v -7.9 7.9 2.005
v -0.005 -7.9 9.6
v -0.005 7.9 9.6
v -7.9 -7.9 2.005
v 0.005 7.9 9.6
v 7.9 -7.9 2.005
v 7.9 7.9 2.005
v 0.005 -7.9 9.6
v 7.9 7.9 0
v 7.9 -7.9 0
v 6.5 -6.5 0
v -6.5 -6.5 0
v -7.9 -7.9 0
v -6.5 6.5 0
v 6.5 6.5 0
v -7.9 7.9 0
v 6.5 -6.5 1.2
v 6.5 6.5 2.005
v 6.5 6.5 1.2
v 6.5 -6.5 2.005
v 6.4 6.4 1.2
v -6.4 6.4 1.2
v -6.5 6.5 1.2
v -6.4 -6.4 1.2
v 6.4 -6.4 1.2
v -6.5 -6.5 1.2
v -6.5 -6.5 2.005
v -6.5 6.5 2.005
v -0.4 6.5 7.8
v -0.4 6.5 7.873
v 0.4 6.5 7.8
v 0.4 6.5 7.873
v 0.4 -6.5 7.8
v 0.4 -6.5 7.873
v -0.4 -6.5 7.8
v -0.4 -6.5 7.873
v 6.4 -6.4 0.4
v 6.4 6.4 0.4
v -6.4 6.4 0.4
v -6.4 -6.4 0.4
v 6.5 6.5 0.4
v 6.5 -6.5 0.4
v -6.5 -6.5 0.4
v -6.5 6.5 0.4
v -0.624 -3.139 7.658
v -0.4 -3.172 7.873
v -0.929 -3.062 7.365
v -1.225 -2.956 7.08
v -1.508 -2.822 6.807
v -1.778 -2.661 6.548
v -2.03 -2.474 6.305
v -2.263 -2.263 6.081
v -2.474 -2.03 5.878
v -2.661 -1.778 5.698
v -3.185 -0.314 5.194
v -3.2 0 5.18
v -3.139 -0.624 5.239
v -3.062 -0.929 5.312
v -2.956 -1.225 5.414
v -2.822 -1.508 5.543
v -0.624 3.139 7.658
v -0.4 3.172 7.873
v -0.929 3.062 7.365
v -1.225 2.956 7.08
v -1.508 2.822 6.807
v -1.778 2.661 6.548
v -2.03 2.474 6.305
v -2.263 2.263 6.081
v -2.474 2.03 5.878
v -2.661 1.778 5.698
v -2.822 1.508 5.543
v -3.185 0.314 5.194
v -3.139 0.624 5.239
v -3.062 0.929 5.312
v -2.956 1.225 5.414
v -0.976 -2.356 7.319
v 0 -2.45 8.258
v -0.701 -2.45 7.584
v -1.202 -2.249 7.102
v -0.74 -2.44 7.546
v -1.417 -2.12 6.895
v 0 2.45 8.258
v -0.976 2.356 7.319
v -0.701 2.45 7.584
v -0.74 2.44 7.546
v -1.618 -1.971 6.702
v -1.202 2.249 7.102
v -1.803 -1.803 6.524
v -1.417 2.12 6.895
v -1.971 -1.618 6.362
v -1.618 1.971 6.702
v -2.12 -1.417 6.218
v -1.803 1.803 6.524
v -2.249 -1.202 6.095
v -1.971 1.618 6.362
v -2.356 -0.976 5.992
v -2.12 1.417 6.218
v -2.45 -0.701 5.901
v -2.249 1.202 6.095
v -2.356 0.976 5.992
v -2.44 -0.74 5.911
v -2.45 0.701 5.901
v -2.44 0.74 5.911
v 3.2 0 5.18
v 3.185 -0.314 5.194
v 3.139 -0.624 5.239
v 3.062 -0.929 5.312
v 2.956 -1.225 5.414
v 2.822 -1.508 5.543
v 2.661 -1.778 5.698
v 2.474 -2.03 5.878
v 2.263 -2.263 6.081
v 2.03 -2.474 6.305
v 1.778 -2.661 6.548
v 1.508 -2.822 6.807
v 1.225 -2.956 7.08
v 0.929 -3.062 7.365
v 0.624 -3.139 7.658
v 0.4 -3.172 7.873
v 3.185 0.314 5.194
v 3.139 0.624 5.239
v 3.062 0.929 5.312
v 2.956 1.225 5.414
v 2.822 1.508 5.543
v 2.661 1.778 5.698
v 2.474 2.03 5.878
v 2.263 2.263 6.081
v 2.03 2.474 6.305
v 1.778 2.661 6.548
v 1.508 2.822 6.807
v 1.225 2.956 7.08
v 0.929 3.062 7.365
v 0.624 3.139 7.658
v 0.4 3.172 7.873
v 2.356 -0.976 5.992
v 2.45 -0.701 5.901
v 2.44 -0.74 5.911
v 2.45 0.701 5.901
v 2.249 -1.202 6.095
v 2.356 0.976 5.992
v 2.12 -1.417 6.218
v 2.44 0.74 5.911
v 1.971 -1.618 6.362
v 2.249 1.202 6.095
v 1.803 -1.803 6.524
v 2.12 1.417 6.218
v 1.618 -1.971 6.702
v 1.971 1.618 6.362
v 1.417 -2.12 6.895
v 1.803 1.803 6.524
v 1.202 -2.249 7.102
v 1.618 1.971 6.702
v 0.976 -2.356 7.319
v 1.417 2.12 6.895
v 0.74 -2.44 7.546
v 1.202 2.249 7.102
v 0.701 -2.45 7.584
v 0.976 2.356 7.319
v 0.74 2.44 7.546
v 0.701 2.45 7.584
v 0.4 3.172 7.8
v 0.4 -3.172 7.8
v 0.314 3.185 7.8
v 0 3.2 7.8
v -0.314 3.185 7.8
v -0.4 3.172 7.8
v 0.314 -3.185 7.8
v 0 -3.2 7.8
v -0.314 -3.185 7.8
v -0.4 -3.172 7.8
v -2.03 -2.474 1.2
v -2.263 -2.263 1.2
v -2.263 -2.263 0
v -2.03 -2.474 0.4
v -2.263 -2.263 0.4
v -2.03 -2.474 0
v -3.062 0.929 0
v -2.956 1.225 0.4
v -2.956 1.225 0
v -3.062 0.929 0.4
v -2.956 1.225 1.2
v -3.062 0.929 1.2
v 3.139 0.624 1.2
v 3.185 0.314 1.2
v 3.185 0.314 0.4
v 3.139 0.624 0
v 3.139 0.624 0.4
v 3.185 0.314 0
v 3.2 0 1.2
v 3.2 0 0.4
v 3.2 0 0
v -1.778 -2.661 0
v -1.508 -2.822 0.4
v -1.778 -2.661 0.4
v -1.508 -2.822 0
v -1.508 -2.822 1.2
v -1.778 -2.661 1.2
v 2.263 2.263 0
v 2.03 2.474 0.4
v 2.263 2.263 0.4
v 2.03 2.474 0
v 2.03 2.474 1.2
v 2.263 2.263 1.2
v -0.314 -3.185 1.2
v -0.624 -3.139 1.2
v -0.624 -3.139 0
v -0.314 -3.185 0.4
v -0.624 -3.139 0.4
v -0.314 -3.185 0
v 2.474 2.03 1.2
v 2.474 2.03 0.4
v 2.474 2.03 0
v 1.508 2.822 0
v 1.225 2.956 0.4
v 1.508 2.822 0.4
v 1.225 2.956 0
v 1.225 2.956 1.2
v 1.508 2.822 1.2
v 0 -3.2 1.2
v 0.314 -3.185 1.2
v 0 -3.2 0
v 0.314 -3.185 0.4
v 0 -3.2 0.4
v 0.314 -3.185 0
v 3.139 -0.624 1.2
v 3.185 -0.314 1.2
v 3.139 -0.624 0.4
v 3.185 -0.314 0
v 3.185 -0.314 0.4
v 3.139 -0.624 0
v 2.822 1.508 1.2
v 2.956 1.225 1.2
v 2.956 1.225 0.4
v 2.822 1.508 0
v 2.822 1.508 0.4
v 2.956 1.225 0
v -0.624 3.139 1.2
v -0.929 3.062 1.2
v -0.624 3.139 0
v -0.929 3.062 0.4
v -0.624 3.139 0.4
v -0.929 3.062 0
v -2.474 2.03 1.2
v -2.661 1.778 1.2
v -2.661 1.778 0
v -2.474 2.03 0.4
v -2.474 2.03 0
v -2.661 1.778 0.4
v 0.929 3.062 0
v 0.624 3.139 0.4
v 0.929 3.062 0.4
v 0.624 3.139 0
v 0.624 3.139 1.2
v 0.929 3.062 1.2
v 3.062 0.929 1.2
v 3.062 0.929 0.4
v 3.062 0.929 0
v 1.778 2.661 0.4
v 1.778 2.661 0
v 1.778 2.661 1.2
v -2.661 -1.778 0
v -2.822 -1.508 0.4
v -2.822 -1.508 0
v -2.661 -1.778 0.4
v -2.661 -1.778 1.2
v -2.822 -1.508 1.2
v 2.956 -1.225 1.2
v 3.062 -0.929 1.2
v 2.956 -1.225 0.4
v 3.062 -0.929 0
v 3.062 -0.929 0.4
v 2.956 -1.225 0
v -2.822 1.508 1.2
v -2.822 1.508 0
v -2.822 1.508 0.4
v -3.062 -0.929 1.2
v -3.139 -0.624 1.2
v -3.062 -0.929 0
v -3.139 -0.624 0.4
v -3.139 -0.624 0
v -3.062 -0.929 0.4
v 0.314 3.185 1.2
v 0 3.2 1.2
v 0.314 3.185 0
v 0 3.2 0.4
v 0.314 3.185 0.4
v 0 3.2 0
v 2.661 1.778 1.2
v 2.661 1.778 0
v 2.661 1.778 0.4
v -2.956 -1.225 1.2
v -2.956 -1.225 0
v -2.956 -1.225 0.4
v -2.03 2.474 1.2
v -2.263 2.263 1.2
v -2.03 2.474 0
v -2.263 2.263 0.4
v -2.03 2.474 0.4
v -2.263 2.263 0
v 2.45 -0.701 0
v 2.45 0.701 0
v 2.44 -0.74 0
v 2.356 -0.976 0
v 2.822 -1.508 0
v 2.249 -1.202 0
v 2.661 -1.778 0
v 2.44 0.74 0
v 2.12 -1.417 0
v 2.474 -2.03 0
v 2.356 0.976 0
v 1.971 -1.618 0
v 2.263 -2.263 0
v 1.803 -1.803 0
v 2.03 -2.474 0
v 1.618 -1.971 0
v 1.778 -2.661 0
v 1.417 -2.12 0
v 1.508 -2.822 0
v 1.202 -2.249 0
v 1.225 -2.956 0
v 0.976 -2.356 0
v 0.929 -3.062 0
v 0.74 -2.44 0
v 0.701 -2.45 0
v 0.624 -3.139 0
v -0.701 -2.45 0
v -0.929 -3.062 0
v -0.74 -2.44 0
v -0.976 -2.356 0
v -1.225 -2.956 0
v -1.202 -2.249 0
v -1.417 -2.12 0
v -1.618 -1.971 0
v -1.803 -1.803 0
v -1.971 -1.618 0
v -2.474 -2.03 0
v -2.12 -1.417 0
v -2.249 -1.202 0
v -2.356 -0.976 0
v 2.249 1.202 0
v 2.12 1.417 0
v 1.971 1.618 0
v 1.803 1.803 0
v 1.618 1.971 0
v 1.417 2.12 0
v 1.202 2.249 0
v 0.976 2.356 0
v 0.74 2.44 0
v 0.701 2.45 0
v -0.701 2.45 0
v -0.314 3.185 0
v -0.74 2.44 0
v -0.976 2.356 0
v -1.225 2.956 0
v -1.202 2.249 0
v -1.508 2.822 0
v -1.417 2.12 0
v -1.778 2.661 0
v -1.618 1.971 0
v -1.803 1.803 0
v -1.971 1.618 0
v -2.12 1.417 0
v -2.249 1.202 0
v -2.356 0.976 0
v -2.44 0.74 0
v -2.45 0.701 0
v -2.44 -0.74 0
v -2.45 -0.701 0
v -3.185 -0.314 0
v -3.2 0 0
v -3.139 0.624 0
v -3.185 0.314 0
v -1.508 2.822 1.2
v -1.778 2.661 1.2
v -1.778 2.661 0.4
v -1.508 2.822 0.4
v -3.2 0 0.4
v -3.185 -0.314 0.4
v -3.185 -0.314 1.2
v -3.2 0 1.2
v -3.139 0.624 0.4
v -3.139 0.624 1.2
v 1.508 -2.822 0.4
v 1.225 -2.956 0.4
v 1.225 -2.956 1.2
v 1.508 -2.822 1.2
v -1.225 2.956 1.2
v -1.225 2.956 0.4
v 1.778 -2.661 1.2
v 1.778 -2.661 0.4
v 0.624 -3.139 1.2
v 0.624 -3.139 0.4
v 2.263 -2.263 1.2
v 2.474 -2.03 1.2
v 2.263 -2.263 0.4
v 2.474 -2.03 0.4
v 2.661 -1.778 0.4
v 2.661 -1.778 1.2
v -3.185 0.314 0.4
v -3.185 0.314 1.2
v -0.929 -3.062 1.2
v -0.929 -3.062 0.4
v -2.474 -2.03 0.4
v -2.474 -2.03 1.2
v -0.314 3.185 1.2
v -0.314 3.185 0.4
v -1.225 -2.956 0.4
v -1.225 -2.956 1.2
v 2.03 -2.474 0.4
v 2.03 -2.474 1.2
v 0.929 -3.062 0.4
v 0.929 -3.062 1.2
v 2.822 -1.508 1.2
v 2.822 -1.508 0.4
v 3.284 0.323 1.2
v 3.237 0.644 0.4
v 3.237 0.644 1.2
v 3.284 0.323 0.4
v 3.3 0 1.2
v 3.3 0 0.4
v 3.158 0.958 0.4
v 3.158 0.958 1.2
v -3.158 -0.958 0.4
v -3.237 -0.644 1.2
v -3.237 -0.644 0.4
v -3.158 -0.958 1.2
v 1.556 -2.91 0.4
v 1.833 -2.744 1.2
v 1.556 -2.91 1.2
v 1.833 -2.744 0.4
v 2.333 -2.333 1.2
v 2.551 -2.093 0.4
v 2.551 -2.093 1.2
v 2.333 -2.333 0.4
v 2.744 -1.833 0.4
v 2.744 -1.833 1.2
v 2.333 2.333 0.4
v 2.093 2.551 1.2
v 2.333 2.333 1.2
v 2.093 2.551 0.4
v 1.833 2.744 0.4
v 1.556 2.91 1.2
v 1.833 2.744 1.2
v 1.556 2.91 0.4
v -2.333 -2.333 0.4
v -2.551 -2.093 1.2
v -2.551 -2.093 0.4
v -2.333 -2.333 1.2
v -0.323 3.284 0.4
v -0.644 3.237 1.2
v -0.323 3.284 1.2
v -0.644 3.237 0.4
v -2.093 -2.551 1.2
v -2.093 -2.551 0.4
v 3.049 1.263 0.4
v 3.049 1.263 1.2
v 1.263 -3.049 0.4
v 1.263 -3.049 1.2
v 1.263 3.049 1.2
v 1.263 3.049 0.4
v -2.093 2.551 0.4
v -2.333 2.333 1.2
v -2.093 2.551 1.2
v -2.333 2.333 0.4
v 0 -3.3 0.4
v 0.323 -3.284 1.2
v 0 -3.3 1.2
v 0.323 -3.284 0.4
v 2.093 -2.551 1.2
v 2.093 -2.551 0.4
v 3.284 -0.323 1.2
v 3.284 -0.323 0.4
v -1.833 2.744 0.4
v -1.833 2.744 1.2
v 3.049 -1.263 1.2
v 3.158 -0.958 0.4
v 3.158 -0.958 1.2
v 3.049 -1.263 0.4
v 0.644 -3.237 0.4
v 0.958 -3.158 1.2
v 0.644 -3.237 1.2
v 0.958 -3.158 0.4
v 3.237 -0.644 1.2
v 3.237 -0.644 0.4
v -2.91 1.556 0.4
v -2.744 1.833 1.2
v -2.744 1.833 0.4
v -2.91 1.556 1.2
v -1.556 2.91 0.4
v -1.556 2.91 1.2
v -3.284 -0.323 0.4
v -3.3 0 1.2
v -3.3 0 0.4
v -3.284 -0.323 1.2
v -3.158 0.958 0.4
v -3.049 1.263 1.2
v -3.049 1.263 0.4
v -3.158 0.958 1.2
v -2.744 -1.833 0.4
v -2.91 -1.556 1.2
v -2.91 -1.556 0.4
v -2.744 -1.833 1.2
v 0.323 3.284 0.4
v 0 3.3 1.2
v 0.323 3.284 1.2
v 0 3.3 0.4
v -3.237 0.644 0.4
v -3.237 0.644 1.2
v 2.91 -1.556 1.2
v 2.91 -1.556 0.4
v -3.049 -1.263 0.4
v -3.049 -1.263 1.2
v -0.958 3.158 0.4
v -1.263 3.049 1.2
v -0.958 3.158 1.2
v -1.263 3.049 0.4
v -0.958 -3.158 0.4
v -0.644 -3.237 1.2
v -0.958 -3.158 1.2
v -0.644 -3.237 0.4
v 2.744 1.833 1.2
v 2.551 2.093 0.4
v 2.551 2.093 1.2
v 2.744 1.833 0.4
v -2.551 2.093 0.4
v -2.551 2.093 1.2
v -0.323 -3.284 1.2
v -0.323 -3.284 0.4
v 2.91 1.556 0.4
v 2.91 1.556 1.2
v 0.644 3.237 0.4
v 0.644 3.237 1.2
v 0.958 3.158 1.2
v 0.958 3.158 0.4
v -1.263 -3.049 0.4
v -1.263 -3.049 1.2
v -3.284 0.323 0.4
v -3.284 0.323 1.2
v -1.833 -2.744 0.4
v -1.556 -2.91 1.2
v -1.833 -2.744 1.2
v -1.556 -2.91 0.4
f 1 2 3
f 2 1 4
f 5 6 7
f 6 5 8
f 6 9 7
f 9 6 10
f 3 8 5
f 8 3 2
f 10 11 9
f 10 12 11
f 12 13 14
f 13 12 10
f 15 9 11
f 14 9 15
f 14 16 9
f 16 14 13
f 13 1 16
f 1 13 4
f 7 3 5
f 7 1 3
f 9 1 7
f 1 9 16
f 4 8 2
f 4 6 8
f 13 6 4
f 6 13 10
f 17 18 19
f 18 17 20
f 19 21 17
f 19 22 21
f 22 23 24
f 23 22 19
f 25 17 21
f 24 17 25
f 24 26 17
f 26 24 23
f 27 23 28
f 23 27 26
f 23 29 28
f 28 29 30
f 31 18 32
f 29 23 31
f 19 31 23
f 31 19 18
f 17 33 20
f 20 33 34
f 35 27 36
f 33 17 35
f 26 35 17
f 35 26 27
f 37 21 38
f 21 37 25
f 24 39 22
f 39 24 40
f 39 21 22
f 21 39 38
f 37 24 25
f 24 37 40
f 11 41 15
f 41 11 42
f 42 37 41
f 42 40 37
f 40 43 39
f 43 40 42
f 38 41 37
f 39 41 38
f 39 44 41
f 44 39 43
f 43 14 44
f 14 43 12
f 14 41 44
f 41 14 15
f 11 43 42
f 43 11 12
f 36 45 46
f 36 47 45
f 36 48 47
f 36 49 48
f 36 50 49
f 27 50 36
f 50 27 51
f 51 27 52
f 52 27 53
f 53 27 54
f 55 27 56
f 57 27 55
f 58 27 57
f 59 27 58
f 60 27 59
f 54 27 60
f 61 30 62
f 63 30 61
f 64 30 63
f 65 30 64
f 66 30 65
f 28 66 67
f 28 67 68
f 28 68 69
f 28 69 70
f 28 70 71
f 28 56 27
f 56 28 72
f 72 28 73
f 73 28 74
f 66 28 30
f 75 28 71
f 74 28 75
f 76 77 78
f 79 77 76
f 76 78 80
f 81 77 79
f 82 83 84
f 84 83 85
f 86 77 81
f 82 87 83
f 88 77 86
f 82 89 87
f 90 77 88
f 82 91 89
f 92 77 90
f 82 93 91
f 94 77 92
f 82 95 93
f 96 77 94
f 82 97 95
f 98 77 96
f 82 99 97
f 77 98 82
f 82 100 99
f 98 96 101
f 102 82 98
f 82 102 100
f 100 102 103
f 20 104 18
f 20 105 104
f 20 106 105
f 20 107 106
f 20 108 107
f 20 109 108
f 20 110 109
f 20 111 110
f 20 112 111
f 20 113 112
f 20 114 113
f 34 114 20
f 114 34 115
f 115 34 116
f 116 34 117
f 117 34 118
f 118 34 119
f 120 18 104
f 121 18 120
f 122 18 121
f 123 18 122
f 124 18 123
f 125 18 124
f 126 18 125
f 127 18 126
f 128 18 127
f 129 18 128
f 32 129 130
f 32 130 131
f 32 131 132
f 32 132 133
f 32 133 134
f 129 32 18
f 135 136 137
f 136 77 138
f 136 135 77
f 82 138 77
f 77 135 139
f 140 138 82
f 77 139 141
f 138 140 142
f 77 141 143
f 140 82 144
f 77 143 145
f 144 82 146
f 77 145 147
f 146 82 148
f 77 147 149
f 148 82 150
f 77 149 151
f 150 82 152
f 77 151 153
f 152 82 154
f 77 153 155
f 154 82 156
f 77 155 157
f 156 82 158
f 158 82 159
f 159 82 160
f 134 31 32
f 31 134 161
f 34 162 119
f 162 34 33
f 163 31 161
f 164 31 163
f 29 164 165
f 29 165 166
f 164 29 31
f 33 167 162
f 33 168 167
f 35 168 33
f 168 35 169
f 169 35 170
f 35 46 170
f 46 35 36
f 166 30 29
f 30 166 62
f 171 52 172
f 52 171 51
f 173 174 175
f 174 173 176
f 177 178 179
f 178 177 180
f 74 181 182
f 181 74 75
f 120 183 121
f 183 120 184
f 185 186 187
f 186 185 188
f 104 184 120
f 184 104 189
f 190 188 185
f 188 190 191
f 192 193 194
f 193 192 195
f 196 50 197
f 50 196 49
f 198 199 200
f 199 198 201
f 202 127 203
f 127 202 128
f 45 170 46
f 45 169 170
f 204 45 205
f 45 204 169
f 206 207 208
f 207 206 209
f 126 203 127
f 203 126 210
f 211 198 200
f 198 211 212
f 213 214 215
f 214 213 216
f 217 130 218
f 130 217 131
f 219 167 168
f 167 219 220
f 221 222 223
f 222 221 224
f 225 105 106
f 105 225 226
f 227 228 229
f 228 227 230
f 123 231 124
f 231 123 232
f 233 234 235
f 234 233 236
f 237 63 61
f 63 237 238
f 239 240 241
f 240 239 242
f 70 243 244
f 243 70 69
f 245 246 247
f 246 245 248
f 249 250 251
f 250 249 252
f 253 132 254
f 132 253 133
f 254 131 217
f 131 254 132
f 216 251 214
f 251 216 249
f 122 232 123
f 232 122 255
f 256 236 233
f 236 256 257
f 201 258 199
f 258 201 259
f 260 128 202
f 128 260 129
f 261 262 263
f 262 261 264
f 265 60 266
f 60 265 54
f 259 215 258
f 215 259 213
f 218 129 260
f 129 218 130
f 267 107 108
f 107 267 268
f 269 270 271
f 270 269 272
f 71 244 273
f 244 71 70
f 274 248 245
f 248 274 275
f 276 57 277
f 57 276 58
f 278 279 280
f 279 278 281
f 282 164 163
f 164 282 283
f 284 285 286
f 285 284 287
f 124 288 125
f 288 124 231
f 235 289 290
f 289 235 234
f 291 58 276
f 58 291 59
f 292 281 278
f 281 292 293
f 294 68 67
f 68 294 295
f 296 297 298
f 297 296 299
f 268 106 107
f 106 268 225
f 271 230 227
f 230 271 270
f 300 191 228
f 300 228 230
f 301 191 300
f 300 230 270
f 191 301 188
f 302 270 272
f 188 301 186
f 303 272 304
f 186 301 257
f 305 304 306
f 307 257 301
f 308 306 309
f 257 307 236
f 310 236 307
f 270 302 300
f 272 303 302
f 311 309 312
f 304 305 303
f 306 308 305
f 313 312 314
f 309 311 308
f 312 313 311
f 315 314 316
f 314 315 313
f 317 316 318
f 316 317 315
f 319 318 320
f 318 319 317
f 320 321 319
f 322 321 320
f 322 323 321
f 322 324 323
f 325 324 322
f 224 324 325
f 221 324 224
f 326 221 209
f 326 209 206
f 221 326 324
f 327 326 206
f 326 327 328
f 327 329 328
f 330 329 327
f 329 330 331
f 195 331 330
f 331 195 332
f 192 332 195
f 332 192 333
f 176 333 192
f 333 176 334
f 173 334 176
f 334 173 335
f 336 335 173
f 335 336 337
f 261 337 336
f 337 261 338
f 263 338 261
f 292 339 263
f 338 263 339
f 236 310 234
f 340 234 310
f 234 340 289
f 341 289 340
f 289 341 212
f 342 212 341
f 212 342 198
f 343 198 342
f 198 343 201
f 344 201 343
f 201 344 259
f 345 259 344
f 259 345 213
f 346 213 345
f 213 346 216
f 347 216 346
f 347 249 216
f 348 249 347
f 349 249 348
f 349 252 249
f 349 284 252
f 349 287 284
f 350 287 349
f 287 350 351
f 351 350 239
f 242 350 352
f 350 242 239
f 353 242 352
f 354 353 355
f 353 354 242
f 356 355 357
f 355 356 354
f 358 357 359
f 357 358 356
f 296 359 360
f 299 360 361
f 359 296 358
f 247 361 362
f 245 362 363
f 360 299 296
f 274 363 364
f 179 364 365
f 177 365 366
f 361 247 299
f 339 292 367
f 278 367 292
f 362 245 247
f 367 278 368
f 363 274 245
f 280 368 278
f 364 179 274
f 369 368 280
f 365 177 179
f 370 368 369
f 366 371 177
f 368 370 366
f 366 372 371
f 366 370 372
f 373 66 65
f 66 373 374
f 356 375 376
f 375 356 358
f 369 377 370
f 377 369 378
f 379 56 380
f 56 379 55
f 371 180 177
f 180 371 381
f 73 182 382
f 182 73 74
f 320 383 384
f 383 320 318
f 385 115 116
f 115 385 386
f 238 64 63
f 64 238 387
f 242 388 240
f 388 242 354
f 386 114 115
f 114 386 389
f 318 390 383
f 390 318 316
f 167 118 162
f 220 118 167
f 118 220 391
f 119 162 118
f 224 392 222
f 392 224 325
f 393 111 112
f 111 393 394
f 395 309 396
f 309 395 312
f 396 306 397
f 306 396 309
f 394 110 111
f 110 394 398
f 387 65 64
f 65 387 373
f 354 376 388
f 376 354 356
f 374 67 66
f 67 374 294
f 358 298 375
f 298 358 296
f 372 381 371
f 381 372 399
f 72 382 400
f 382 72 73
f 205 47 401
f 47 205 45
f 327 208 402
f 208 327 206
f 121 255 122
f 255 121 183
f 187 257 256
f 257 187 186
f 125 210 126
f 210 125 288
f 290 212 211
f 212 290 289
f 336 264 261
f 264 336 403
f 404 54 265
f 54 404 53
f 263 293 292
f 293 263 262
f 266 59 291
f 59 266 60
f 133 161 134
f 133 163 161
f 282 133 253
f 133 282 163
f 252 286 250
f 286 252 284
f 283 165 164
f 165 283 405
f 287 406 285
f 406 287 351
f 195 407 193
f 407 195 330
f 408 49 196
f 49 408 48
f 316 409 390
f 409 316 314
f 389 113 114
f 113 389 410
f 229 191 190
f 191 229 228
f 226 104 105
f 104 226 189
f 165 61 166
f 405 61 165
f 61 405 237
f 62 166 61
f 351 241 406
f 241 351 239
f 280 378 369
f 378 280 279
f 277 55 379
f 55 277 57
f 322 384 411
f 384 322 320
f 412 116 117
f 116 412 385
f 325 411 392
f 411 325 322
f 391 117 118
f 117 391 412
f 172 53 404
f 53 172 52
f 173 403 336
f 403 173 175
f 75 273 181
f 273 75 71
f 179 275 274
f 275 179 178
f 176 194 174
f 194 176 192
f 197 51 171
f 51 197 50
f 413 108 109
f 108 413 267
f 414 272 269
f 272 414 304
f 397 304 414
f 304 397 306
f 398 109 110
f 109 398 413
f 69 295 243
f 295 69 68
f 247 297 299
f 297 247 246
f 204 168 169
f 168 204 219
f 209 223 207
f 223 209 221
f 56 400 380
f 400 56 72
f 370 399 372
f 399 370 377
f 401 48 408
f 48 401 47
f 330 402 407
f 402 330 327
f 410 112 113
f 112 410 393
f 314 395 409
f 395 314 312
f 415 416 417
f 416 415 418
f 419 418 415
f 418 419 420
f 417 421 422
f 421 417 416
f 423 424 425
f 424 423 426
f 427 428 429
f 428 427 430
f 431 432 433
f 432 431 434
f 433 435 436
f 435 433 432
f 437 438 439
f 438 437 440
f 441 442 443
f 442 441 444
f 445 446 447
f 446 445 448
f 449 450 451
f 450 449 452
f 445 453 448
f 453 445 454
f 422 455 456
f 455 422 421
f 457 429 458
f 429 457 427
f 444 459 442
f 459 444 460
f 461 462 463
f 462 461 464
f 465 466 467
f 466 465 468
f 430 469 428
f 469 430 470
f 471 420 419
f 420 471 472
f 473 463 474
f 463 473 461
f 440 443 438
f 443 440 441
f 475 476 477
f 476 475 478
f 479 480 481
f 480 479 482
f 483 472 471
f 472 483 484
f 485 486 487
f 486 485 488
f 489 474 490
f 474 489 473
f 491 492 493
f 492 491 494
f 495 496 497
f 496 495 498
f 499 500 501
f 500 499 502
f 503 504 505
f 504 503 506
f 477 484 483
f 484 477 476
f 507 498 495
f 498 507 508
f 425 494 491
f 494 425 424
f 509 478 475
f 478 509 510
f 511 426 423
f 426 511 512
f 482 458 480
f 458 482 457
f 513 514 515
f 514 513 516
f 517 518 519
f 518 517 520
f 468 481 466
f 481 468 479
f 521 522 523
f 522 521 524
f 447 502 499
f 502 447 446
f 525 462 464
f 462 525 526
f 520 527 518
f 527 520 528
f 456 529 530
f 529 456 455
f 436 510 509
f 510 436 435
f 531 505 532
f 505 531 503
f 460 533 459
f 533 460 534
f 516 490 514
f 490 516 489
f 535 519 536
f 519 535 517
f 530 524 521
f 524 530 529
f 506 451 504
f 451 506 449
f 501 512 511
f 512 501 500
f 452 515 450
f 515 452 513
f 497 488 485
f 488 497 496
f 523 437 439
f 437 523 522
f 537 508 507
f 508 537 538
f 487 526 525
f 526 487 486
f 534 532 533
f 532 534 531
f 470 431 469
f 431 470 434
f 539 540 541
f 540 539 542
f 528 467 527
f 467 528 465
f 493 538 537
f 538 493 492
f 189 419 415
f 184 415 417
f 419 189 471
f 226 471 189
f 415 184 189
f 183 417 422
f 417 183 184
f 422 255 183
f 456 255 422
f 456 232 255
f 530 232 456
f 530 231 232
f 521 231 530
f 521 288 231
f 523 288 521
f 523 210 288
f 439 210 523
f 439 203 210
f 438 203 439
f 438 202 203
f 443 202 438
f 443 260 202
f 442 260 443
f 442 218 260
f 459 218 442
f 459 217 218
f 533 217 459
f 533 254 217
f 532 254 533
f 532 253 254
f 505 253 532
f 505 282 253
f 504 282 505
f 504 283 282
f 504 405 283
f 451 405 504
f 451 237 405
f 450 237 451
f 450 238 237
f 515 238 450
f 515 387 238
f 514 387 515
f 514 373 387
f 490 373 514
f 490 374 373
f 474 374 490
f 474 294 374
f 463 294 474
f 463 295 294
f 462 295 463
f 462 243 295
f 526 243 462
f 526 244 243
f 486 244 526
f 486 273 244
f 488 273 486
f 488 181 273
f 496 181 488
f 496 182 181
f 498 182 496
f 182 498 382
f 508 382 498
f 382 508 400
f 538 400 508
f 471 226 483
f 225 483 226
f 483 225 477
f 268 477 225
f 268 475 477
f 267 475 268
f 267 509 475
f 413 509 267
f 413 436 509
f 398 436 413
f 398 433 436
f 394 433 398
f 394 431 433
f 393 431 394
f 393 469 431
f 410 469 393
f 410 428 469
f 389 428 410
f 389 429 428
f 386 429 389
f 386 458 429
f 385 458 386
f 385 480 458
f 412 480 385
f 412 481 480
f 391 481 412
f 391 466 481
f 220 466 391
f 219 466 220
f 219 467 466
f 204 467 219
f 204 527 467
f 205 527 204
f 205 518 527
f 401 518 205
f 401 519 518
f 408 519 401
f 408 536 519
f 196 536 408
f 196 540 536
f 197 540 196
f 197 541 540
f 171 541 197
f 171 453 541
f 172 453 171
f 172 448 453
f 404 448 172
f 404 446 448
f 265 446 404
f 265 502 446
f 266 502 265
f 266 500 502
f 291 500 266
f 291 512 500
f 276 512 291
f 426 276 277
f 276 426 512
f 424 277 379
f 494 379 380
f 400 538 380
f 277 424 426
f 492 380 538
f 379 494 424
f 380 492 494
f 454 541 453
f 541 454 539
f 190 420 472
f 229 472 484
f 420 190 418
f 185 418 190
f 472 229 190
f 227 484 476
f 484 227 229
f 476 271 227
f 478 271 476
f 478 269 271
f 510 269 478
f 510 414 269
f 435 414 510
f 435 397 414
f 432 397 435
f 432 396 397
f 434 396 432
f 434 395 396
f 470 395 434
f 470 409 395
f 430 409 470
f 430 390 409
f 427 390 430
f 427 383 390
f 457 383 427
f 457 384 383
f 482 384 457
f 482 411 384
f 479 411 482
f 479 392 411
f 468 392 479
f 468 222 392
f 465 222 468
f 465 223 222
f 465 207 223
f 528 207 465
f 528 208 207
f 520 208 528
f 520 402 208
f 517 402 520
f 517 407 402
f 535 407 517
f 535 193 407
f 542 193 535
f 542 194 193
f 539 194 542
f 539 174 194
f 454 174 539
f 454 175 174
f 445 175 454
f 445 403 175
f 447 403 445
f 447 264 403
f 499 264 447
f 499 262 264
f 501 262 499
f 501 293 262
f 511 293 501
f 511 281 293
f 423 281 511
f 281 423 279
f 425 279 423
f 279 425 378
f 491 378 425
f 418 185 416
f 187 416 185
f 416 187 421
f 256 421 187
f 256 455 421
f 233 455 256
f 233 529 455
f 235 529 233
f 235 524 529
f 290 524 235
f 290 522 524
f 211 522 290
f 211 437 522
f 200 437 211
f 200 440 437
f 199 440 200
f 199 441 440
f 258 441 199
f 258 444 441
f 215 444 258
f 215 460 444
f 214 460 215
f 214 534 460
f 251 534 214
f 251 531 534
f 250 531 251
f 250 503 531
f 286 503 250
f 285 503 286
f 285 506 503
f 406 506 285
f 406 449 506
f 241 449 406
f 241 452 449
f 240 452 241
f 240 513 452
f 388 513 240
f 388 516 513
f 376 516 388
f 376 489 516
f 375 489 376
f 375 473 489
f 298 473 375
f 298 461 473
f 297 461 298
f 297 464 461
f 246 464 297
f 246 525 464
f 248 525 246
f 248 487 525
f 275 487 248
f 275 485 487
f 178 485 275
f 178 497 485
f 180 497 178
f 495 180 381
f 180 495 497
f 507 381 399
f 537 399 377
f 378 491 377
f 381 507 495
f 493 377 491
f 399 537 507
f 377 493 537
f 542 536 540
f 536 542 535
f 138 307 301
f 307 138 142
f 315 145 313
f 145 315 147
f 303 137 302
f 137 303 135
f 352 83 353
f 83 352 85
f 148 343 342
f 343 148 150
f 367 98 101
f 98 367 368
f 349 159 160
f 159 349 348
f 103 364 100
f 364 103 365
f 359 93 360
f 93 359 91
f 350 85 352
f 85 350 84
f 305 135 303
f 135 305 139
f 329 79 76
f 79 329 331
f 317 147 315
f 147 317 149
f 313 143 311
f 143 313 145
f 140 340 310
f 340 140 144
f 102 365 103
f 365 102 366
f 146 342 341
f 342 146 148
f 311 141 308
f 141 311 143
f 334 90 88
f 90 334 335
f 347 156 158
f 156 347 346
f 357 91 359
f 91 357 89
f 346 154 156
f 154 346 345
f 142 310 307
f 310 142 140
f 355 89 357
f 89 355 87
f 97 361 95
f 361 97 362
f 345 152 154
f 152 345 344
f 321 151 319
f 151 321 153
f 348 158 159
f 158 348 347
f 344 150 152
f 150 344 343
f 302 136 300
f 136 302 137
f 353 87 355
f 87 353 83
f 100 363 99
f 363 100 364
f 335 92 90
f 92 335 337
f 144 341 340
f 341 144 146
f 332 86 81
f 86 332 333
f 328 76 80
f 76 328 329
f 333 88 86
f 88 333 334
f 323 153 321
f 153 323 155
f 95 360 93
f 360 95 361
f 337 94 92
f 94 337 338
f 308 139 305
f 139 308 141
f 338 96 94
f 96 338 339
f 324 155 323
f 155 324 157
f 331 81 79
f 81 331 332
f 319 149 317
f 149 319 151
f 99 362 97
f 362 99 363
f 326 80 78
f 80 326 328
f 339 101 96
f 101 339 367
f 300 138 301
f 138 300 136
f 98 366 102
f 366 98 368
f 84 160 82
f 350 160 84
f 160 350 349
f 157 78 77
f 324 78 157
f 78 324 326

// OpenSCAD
// file: ../../lib/connectors.scad
module
mb_connector_prism(side, height, size)
{
  zRots = [ 315, 135, 45, 225 ];
  rotate([ 90, 90, zRots[side] ])
    translate([ -0.5 * height, -0.5 * size, -0.5 * size ])
      polyhedron(points =
                   [
                     [ 0, 0, 0 ],
                     [ height, 0, 0 ],
                     [ height, size, 0 ],
                     [ 0, size, 0 ],
                     [ 0, size, size ],
                     [ height, size, size ]
                   ],
                 faces = [
                   [ 0, 1, 2, 3 ],
                   [ 5, 4, 3, 2 ],
                   [ 0, 4, 5, 1 ],
                   [ 0, 3, 4 ],
                   [ 5, 2, 1 ]
                 ]);
}

module
mb_connectors(side, grid, baseHeight, height, size, depth, gs, inverse)
{
  sigs = [ -1, 1, -1, 1 ];
  gX = [ 0, 0, 1, 1 ];
  gY = [ 1, 1, 0, 0 ];

rotate(inverse ? [0,0,180]:[0,0,0])
  for (i = [0:1:grid[gY[side]] - 1]) {
    t0X = (0.5 * grid[gX[side]] * gs + (inverse ? -1 : 1) * depth);
    t0Y = (i + 0.5 - 0.5 * grid[gY[side]]) * gs;

    color([ 0.945, 0.769, 0.059 ]) // f1c40f
      translate([

        side < 2 ? (inverse ? -1 : 1) * sigs[side] * t0X : t0Y,
        side < 2 ? t0Y : (inverse ? -1 : 1) * sigs[side] * t0X,
        -0.5 * baseHeight + 0.5 *
        (height + (inverse ? -0.02 : 0))
      ]) mb_connector_prism(side, height+ (inverse ? 0.02 : 0), size);
  }
}

module
mb_connector_grooves(side,
                     grid,
                     baseHeight,
                     height,
                     tolerance,
                     size,
                     depth,
                     gs,
                     inverse)
{
  gX = [ 0, 0, 1, 1 ];
  gY = [ 1, 1, 0, 0 ];
  rot = [ 90, 90, 0, 0 ];
  
  sigs = [ 1, -1, -1, 1 ];
  rotate([ 90, inverse ? 180 : 0, rot[side] ]) for (i =
                                                      [0:1:grid[gY[side]] - 1])
  {
    translate([
      (-(0.5 * grid[gY[side]] - 0.5) * gs + i * gs),
      -0.5 * baseHeight + height,
      sigs[side] * (-0.5 * grid[gX[side]] * gs + 0.5 * depth - 0.02)
    ]) mb_connector_prism(3, depth + 0.02, size);
  }
}
// file: ../../lib/pcb.scad
module mb_clip_prism(l, w, h) {
    translate([-0.5*l,0, -0.5*h])
    rotate([0,0,-90])
       polyhedron(points=[
               [0,0,h],           // 0    front top corner
               [0,0,0],[w,0,0],   // 1, 2 front left & right bottom corners
               [0,l,h],           // 3    back top corner
               [0,l,0],[w,l,0]    // 4, 5 back left & right bottom corners
       ], faces=[ // points for all faces must be ordered clockwise when looking in
               [0,2,1],    // top face
               [3,4,5],    // base face
               [0,1,4,3],  // h face
               [1,2,5,4],  // w face
               [0,3,5,2],  // hypotenuse face
       ]);
}

module mb_clip_holder(
    clipLength, 
    clipBaseHeight, 
    clipBaseThickness, 
    clipTopSlantThickness, 
    clipTopSlantHeight, 
    clipBottomSlantHeight, 
    clipPlateHeight
){
    translate([0,0, 0])
        cube([clipLength, clipBaseThickness, clipBaseHeight], center=true);
    
    translate([0, -0.5 * (clipTopSlantThickness - clipBaseThickness), 0.5 * (clipBaseHeight + clipPlateHeight)])
        cube([clipLength, clipTopSlantThickness, clipPlateHeight], center=true);
    
    translate([0, 0.5*clipBaseThickness, 0.5 * clipBaseHeight]){
        translate([0, 0, clipPlateHeight + 0.5 * clipTopSlantHeight])
            mb_clip_prism(clipLength, clipTopSlantThickness, clipTopSlantHeight);
        
        //Bottom Prism
        translate([0, -clipBaseThickness , -0.5 * clipBottomSlantHeight])
            rotate([0,180,0])
                mb_clip_prism(clipLength, clipTopSlantThickness - clipBaseThickness, clipBottomSlantHeight);
    }   
    
}

module mb_screw_socket(socketSize, socketHeight, socketHoleSize, socketResolution = 30, holeResolution = 30){
    difference(){
        cylinder(h=socketHeight, r=0.5 * socketSize, center=true, $fn=socketResolution);
        if(socketHoleSize > 0){
            cylinder(h=socketHeight * 1.1, r=0.5*socketHoleSize, center=true, $fn=holeResolution);
        }
    }
}

module mb_pcb_screw_sockets(
    screwSocketSize = 5,
    screwSocketHoleSize = 2.2,
    screwSocketHeight = 3,
    screwSockets = []
){
    translate([0, 0, 0.5 * screwSocketHeight])
        for (a = [ 0 : 1 : len(screwSockets) - 1 ]){
            translate([screwSockets[a][0], screwSockets[a][1], 0])
                mb_screw_socket(
                    socketSize = screwSocketSize,
                    socketHeight = screwSocketHeight,
                    socketHoleSize = screwSocketHoleSize
                );
        }
}

module mb_pcb_clips(
    pcbDimensions = [30, 20, 3],
    
    clipBaseThickness = 1.2,
    clipLength = 8,
    clipPlateHeight = 0.2,
    clipTopSlantHeight = 1,
    clipBottomSlantHeight = 0.25,
    clipOverhangThickness = 0.5,
    
    pedestalSize = 3,
    pedestalHeight = 2
){    
    clipBaseHeight = pcbDimensions[2] + pedestalHeight;

    
        translate([0, 0.5 * (pcbDimensions[1] + clipBaseThickness), 0.5*clipBaseHeight]){
            mb_clip_holder(clipLength, clipBaseHeight, clipBaseThickness, clipOverhangThickness + clipBaseThickness, clipTopSlantHeight, clipBottomSlantHeight, clipPlateHeight);
        }   
        
        translate([0, -0.5 * (pcbDimensions[1] + clipBaseThickness), 0.5*clipBaseHeight]){
            rotate([0, 0, 180])
                mb_clip_holder(clipLength, clipBaseHeight, clipBaseThickness, clipOverhangThickness + clipBaseThickness, clipTopSlantHeight, clipBottomSlantHeight, clipPlateHeight);
        }
        
        translate([0.5*(pcbDimensions[0] + clipBaseThickness), 0, 0.5*clipBaseHeight]){
            rotate([0, 0, -90])
                mb_clip_holder(clipLength, clipBaseHeight, clipBaseThickness, clipOverhangThickness + clipBaseThickness, clipTopSlantHeight, clipBottomSlantHeight, clipPlateHeight);
        }
        
        translate([-0.5*(pcbDimensions[0] + clipBaseThickness), 0, 0.5*clipBaseHeight]){
            rotate([0, 0, 90]){
                mb_clip_holder(clipLength, clipBaseHeight, clipBaseThickness, clipOverhangThickness + clipBaseThickness, clipTopSlantHeight, clipBottomSlantHeight, clipPlateHeight);
            }
        }
        
        translate([-0.5 * (pcbDimensions[0] - pedestalSize) - clipBaseThickness, 0.5 * (pedestalSize - pcbDimensions[1]) - clipBaseThickness, 0.5*pedestalHeight]){
            cube([pedestalSize, pedestalSize, pedestalHeight], center=true);
        }
        
        translate([0.5 * (pcbDimensions[0] - pedestalSize) + clipBaseThickness, 0.5 * (pedestalSize - pcbDimensions[1]) - clipBaseThickness, 0.5*pedestalHeight]){
            cube([pedestalSize, pedestalSize, pedestalHeight], center=true);
        }
        
        translate([-0.5 * (pcbDimensions[0] - pedestalSize) - clipBaseThickness, -0.5 * (pedestalSize - pcbDimensions[1]) + clipBaseThickness, 0.5*pedestalHeight]){
            cube([pedestalSize, pedestalSize, pedestalHeight], center=true);
        }
        
        translate([0.5 * (pcbDimensions[0] - pedestalSize) + clipBaseThickness, -0.5 * (pedestalSize - pcbDimensions[1]) + clipBaseThickness, 0.5*pedestalHeight]){
            cube([pedestalSize, pedestalSize, pedestalHeight], center=true);
        }
    
}
// file: ../../lib/svg3d.scad
module mb_svg3d(file, orgWidth, orgHeight, depth, size, center = true){
    translate([0, 0, -0.5*depth])
    //scale([size, size, 1])
        //surface(file = file, center = true, invert = true);
        
        
        linear_extrude(depth) {
            scale([size, size, 0])
            translate([-0.5*orgWidth, -0.5*orgHeight, 0])
                import(file);
        }
        
    
}
// file: ../../lib/text3d.scad
module mb_text3d(text, textDepth, textSize, textFont, textSpacing, textHorizontalAlign = "center", textVerticalAlign = "center", center = true){
    translate([0,0,-0.5*textDepth])
        linear_extrude(textDepth) {
            text(text, size = textSize, font = textFont, spacing = textSpacing, halign = textHorizontalAlign, valign = textVerticalAlign, $fn = 64);
        }
}
// file: ../../lib/shapes.scad
module mb_roundedcube(size = [1, 1, 1], center = false, radius = 0.5, apply_to = "all", resolution = 20) {
	// If single value, convert to [x, y, z] vector
	size = (size[0] == undef) ? [size, size, size] : size;

	translate_min = radius;
	translate_xmax = size[0] - radius;
	translate_ymax = size[1] - radius;
	translate_zmax = size[2] - radius;

	diameter = radius * 2;

	obj_translate = (center == false) ?
		[0, 0, 0] : [
			-(size[0] / 2),
			-(size[1] / 2),
			-(size[2] / 2)
		];

	translate(v = obj_translate) {
		hull() {
			for (translate_x = [translate_min, translate_xmax]) {
				x_at = (translate_x == translate_min) ? "min" : "max";
				for (translate_y = [translate_min, translate_ymax]) {
					y_at = (translate_y == translate_min) ? "min" : "max";
					for (translate_z = [translate_min, translate_zmax]) {
						z_at = (translate_z == translate_min) ? "min" : "max";

						translate(v = [translate_x, translate_y, translate_z])
						if (
							(apply_to == "all") ||
							(apply_to == "xmin" && x_at == "min") || (apply_to == "xmax" && x_at == "max") ||
							(apply_to == "ymin" && y_at == "min") || (apply_to == "ymax" && y_at == "max") ||
							(apply_to == "zmin" && z_at == "min") || (apply_to == "zmax" && z_at == "max")
						) {
							sphere(r = radius, $fn = resolution);
						} else {
							rotate = 
								(apply_to == "xmin" || apply_to == "xmax" || apply_to == "x") ? [0, 90, 0] : (
								(apply_to == "ymin" || apply_to == "ymax" || apply_to == "y") ? [90, 90, 0] :
								[0, 0, 0]
							);
							rotate(a = rotate)
							cylinder(h = diameter, r = radius, center = true, $fn = resolution);
						}
					}
				}
			}
		}
	}
}

module mb_roundedcube_simple(size = [1, 1, 1], center = false, radius = 0.5, resolution = 20) {
	// If single value, convert to [x, y, z] vector
	size = (size[0] == undef) ? [size, size, size] : size;

	translate = (center == false) ?
		[radius, radius, radius] :
		[
			radius - (size[0] / 2),
			radius - (size[1] / 2),
			radius - (size[2] / 2)
	];

	translate(v = translate)
	minkowski() {
		cube(size = [
			size[0] - (radius * 2),
			size[1] - (radius * 2),
			size[2] - (radius * 2)
		]);
		sphere(r = radius, $fn = resolution);
	}
}

module mb_roundedcube_custom(size = [1, 1, 1], center = false, radius = 0.1, resolution = 20) {
	size = (size[0] == undef) ? [size, size, size] : size;

	obj_translate = (center == false) ?
		[0, 0, 0] : [
			-(size[0] / 2),
			-(size[1] / 2),
			-(size[2] / 2)
		];


	translate(v = obj_translate) {
		if(radius == 0 || radius == [0,0,0,0]){
			cube(size=size);
		}
		else{
			rots=[180,90,0,-90];
			radius = (radius[0] == undef) ? [radius, radius, radius, radius] : radius;
			hull() {
			//union(){
				for (i = [ 0 : 1 : 3 ]){
					cornerRadius = radius[i] == 0 ? 0.1 : radius[i];
					translateX = i < 2 ? cornerRadius : size[0] - cornerRadius;
					translateY = (i == 0) || (i == 3) ? cornerRadius : size[1] - cornerRadius;
				
					//translate_min = cornerRadius;
					//translate_zmax = size[2] - cornerRadius;						

					//for (translate_z = [translate_min, translate_zmax]) {
					translate(v = [translateX, translateY, 0.5 * size[2]]){
							if(radius[i] == 0)
							cube(size = [2*cornerRadius, 2*cornerRadius, size[2]], center = true);
							else
							rotate([0,0,rots[i]])
								translate([0,0,-0.5*size[2]])
									rotate_extrude(angle=90) 
										square([cornerRadius, size[2]]);
							//cylinder(h = size[2], r = cornerRadius, center = true, $fn = resolution);
					}
					//}
				}
			}
		}
	}
}

module mb_rounded_block(size, resolution, center=true, radius = 0){
	if((radius == 0) || (radius == [0, 0, 0]) || (radius == [[0,0,0,0], [0,0,0,0], [0,0,0,0]])){
		cube(size = size, center = center);
	}
	else if((radius[0] == 0 || radius[0] == [0,0,0,0]) && (radius[1] == 0 || radius[1] == [0,0,0,0]) && (radius[2] != 0 && radius[2] != [0,0,0,0])){
		mb_roundedcube_custom(
			size = size, 
			center = center, 
			radius = radius[2], 
			resolution = resolution
		);
	}
	else{
		radius = (radius[0] == undef) ? [radius, radius, radius] : radius;
		size = (size[0] == undef) ? [size, size, size] : size;
		intersection() {
			
			//X-Axis
			rotate([0,90,0])     
				mb_roundedcube_custom(
					size = [size[2], size[1], size[0]], 
					center = center, 
					radius = radius[0], 
					resolution = resolution
				);
			
			//Y-Axis
			rotate([90,0,0]) 
				mb_roundedcube_custom(
					size = [size[0], size[2], size[1]], 
					center = center, 
					radius = radius[1], 
					resolution = resolution
				);
			
			//Z-Axis
			mb_roundedcube_custom(
				size = size, 
				center = center, 
				radius = radius[2], 
				resolution = resolution
			);
		}
	}
}

module mb_torus(circleRadius, torusRadius, circleResolution = 30, torusResolution = 30){
    rotate_extrude(convexity = 10, $fn = torusResolution)
        translate([torusRadius - circleRadius, 0, 0])
            circle(r = circleRadius, $fn = circleResolution);
}
// main file
/**
* MachineBlocks
* https://machineblocks.com/examples/slanted
*
* Slanted Brick S1.1 2x2
* Copyright (c) 2022 - 2025 Jan Philipp Knoeller <pk@pksoftware.de>
*
* Published under license:
* Creative Commons Attribution-NonCommercial-ShareAlike 4.0 International 
* https://creativecommons.org/licenses/by-nc-sa/4.0/
*
*/

// Include the library
use <../../lib/block.scad>;

/* [Size] */

// Brick size in X-direction specified as multiple of an 1x1 brick.
brickSizeX = 2; // [1:32]  
// Brick size in Y-direction specified as multiple of an 1x1 brick.
brickSizeY = 2; // [1:32]  
// Height of brick specified as number of layers. Each layer has the height of one plate.
baseLayers = 3; // [1:24]

/* [Appearance] */

// Type of cut-out on the underside.
baseCutoutType = "classic"; // [none, classic]
// Whether to draw knobs.
knobs = true;
// Whether knobs should be centered.
knobCentered = false;
// Type of the knobs
knobType = "classic"; // [classic, technic]

// Whether to draw pillars.
pillars = true;

// Whether brick should have Technic holes along X-axis.
holesX = false;
// Whether brick should have Technic holes along Y-axis.
holesY = false;
// Whether brick should have Technic holes along Z-axis.
holesZ = false;

// Whether brick should have a pit
pit = false;
// Whether knobs should be drawn inside pit
pitKnobs = false;
// Pit wall thickness as multiple of one brick side length
pitWallThickness = 0.333;

// Slanting size on X0 side specified as multiple of an 1x1 brick.
slantingX0 = 1;
// Slanting size on X1 side specified as multiple of an 1x1 brick.
slantingX1 = 1;
// Slanting size on Y0 side specified as multiple of an 1x1 brick.
slantingY0 = 0;
// Slanting size on Y1 side specified as multiple of an 1x1 brick.
slantingY1 = 0;

/* [Quality] */

// Quality of the preview in relation to the final rendering.
previewQuality = 0.5; // [0.1:0.1:1]
// Number of drawn fragments for roundings in the final rendering.
roundingResolution = 64; // [16:8:128]

/* [Calibration] */

// Adjustment of the height (mm)
baseHeightAdjustment = 0.0;
// Adjustment of each side (mm)
baseSideAdjustment = -0.1;
// Diameter of the knobs (mm)
knobSize = 5.0;
// Thickness of the walls (mm)
wallThickness = 1.5;
// Diameter of the Z-Tubes (mm)
tubeZSize = 6.4;

// Generate the block
block(
    grid = [brickSizeX, brickSizeY],
    baseLayers = baseLayers,
    baseCutoutType = baseCutoutType,
    
    knobs = knobs,
    knobCentered = knobCentered,
    knobType = knobType,
    
    pillars = pillars,
    
    holesX = holesX,
    holesY = holesY,
    holesZ = holesZ,
    
    pit = pit,
    pitKnobs = pitKnobs,
    pitWallThickness = pitWallThickness,
    
    slanting = ((slantingX0 != 0) || (slantingX1 != 0) || (slantingY0 != 0) || (slantingY1 != 0)) ? [slantingX0, slantingX1, slantingY0, slantingY1] : false, 

    previewQuality = previewQuality,
    baseRoundingResolution = roundingResolution,
    holeRoundingResolution = roundingResolution,
    knobRoundingResolution = roundingResolution,
    pillarRoundingResolution = roundingResolution,

    baseHeightAdjustment = baseHeightAdjustment,
    baseSideAdjustment = baseSideAdjustment,
    knobSize = knobSize,
    wallThickness = wallThickness,
    tubeZSize = tubeZSize
);
